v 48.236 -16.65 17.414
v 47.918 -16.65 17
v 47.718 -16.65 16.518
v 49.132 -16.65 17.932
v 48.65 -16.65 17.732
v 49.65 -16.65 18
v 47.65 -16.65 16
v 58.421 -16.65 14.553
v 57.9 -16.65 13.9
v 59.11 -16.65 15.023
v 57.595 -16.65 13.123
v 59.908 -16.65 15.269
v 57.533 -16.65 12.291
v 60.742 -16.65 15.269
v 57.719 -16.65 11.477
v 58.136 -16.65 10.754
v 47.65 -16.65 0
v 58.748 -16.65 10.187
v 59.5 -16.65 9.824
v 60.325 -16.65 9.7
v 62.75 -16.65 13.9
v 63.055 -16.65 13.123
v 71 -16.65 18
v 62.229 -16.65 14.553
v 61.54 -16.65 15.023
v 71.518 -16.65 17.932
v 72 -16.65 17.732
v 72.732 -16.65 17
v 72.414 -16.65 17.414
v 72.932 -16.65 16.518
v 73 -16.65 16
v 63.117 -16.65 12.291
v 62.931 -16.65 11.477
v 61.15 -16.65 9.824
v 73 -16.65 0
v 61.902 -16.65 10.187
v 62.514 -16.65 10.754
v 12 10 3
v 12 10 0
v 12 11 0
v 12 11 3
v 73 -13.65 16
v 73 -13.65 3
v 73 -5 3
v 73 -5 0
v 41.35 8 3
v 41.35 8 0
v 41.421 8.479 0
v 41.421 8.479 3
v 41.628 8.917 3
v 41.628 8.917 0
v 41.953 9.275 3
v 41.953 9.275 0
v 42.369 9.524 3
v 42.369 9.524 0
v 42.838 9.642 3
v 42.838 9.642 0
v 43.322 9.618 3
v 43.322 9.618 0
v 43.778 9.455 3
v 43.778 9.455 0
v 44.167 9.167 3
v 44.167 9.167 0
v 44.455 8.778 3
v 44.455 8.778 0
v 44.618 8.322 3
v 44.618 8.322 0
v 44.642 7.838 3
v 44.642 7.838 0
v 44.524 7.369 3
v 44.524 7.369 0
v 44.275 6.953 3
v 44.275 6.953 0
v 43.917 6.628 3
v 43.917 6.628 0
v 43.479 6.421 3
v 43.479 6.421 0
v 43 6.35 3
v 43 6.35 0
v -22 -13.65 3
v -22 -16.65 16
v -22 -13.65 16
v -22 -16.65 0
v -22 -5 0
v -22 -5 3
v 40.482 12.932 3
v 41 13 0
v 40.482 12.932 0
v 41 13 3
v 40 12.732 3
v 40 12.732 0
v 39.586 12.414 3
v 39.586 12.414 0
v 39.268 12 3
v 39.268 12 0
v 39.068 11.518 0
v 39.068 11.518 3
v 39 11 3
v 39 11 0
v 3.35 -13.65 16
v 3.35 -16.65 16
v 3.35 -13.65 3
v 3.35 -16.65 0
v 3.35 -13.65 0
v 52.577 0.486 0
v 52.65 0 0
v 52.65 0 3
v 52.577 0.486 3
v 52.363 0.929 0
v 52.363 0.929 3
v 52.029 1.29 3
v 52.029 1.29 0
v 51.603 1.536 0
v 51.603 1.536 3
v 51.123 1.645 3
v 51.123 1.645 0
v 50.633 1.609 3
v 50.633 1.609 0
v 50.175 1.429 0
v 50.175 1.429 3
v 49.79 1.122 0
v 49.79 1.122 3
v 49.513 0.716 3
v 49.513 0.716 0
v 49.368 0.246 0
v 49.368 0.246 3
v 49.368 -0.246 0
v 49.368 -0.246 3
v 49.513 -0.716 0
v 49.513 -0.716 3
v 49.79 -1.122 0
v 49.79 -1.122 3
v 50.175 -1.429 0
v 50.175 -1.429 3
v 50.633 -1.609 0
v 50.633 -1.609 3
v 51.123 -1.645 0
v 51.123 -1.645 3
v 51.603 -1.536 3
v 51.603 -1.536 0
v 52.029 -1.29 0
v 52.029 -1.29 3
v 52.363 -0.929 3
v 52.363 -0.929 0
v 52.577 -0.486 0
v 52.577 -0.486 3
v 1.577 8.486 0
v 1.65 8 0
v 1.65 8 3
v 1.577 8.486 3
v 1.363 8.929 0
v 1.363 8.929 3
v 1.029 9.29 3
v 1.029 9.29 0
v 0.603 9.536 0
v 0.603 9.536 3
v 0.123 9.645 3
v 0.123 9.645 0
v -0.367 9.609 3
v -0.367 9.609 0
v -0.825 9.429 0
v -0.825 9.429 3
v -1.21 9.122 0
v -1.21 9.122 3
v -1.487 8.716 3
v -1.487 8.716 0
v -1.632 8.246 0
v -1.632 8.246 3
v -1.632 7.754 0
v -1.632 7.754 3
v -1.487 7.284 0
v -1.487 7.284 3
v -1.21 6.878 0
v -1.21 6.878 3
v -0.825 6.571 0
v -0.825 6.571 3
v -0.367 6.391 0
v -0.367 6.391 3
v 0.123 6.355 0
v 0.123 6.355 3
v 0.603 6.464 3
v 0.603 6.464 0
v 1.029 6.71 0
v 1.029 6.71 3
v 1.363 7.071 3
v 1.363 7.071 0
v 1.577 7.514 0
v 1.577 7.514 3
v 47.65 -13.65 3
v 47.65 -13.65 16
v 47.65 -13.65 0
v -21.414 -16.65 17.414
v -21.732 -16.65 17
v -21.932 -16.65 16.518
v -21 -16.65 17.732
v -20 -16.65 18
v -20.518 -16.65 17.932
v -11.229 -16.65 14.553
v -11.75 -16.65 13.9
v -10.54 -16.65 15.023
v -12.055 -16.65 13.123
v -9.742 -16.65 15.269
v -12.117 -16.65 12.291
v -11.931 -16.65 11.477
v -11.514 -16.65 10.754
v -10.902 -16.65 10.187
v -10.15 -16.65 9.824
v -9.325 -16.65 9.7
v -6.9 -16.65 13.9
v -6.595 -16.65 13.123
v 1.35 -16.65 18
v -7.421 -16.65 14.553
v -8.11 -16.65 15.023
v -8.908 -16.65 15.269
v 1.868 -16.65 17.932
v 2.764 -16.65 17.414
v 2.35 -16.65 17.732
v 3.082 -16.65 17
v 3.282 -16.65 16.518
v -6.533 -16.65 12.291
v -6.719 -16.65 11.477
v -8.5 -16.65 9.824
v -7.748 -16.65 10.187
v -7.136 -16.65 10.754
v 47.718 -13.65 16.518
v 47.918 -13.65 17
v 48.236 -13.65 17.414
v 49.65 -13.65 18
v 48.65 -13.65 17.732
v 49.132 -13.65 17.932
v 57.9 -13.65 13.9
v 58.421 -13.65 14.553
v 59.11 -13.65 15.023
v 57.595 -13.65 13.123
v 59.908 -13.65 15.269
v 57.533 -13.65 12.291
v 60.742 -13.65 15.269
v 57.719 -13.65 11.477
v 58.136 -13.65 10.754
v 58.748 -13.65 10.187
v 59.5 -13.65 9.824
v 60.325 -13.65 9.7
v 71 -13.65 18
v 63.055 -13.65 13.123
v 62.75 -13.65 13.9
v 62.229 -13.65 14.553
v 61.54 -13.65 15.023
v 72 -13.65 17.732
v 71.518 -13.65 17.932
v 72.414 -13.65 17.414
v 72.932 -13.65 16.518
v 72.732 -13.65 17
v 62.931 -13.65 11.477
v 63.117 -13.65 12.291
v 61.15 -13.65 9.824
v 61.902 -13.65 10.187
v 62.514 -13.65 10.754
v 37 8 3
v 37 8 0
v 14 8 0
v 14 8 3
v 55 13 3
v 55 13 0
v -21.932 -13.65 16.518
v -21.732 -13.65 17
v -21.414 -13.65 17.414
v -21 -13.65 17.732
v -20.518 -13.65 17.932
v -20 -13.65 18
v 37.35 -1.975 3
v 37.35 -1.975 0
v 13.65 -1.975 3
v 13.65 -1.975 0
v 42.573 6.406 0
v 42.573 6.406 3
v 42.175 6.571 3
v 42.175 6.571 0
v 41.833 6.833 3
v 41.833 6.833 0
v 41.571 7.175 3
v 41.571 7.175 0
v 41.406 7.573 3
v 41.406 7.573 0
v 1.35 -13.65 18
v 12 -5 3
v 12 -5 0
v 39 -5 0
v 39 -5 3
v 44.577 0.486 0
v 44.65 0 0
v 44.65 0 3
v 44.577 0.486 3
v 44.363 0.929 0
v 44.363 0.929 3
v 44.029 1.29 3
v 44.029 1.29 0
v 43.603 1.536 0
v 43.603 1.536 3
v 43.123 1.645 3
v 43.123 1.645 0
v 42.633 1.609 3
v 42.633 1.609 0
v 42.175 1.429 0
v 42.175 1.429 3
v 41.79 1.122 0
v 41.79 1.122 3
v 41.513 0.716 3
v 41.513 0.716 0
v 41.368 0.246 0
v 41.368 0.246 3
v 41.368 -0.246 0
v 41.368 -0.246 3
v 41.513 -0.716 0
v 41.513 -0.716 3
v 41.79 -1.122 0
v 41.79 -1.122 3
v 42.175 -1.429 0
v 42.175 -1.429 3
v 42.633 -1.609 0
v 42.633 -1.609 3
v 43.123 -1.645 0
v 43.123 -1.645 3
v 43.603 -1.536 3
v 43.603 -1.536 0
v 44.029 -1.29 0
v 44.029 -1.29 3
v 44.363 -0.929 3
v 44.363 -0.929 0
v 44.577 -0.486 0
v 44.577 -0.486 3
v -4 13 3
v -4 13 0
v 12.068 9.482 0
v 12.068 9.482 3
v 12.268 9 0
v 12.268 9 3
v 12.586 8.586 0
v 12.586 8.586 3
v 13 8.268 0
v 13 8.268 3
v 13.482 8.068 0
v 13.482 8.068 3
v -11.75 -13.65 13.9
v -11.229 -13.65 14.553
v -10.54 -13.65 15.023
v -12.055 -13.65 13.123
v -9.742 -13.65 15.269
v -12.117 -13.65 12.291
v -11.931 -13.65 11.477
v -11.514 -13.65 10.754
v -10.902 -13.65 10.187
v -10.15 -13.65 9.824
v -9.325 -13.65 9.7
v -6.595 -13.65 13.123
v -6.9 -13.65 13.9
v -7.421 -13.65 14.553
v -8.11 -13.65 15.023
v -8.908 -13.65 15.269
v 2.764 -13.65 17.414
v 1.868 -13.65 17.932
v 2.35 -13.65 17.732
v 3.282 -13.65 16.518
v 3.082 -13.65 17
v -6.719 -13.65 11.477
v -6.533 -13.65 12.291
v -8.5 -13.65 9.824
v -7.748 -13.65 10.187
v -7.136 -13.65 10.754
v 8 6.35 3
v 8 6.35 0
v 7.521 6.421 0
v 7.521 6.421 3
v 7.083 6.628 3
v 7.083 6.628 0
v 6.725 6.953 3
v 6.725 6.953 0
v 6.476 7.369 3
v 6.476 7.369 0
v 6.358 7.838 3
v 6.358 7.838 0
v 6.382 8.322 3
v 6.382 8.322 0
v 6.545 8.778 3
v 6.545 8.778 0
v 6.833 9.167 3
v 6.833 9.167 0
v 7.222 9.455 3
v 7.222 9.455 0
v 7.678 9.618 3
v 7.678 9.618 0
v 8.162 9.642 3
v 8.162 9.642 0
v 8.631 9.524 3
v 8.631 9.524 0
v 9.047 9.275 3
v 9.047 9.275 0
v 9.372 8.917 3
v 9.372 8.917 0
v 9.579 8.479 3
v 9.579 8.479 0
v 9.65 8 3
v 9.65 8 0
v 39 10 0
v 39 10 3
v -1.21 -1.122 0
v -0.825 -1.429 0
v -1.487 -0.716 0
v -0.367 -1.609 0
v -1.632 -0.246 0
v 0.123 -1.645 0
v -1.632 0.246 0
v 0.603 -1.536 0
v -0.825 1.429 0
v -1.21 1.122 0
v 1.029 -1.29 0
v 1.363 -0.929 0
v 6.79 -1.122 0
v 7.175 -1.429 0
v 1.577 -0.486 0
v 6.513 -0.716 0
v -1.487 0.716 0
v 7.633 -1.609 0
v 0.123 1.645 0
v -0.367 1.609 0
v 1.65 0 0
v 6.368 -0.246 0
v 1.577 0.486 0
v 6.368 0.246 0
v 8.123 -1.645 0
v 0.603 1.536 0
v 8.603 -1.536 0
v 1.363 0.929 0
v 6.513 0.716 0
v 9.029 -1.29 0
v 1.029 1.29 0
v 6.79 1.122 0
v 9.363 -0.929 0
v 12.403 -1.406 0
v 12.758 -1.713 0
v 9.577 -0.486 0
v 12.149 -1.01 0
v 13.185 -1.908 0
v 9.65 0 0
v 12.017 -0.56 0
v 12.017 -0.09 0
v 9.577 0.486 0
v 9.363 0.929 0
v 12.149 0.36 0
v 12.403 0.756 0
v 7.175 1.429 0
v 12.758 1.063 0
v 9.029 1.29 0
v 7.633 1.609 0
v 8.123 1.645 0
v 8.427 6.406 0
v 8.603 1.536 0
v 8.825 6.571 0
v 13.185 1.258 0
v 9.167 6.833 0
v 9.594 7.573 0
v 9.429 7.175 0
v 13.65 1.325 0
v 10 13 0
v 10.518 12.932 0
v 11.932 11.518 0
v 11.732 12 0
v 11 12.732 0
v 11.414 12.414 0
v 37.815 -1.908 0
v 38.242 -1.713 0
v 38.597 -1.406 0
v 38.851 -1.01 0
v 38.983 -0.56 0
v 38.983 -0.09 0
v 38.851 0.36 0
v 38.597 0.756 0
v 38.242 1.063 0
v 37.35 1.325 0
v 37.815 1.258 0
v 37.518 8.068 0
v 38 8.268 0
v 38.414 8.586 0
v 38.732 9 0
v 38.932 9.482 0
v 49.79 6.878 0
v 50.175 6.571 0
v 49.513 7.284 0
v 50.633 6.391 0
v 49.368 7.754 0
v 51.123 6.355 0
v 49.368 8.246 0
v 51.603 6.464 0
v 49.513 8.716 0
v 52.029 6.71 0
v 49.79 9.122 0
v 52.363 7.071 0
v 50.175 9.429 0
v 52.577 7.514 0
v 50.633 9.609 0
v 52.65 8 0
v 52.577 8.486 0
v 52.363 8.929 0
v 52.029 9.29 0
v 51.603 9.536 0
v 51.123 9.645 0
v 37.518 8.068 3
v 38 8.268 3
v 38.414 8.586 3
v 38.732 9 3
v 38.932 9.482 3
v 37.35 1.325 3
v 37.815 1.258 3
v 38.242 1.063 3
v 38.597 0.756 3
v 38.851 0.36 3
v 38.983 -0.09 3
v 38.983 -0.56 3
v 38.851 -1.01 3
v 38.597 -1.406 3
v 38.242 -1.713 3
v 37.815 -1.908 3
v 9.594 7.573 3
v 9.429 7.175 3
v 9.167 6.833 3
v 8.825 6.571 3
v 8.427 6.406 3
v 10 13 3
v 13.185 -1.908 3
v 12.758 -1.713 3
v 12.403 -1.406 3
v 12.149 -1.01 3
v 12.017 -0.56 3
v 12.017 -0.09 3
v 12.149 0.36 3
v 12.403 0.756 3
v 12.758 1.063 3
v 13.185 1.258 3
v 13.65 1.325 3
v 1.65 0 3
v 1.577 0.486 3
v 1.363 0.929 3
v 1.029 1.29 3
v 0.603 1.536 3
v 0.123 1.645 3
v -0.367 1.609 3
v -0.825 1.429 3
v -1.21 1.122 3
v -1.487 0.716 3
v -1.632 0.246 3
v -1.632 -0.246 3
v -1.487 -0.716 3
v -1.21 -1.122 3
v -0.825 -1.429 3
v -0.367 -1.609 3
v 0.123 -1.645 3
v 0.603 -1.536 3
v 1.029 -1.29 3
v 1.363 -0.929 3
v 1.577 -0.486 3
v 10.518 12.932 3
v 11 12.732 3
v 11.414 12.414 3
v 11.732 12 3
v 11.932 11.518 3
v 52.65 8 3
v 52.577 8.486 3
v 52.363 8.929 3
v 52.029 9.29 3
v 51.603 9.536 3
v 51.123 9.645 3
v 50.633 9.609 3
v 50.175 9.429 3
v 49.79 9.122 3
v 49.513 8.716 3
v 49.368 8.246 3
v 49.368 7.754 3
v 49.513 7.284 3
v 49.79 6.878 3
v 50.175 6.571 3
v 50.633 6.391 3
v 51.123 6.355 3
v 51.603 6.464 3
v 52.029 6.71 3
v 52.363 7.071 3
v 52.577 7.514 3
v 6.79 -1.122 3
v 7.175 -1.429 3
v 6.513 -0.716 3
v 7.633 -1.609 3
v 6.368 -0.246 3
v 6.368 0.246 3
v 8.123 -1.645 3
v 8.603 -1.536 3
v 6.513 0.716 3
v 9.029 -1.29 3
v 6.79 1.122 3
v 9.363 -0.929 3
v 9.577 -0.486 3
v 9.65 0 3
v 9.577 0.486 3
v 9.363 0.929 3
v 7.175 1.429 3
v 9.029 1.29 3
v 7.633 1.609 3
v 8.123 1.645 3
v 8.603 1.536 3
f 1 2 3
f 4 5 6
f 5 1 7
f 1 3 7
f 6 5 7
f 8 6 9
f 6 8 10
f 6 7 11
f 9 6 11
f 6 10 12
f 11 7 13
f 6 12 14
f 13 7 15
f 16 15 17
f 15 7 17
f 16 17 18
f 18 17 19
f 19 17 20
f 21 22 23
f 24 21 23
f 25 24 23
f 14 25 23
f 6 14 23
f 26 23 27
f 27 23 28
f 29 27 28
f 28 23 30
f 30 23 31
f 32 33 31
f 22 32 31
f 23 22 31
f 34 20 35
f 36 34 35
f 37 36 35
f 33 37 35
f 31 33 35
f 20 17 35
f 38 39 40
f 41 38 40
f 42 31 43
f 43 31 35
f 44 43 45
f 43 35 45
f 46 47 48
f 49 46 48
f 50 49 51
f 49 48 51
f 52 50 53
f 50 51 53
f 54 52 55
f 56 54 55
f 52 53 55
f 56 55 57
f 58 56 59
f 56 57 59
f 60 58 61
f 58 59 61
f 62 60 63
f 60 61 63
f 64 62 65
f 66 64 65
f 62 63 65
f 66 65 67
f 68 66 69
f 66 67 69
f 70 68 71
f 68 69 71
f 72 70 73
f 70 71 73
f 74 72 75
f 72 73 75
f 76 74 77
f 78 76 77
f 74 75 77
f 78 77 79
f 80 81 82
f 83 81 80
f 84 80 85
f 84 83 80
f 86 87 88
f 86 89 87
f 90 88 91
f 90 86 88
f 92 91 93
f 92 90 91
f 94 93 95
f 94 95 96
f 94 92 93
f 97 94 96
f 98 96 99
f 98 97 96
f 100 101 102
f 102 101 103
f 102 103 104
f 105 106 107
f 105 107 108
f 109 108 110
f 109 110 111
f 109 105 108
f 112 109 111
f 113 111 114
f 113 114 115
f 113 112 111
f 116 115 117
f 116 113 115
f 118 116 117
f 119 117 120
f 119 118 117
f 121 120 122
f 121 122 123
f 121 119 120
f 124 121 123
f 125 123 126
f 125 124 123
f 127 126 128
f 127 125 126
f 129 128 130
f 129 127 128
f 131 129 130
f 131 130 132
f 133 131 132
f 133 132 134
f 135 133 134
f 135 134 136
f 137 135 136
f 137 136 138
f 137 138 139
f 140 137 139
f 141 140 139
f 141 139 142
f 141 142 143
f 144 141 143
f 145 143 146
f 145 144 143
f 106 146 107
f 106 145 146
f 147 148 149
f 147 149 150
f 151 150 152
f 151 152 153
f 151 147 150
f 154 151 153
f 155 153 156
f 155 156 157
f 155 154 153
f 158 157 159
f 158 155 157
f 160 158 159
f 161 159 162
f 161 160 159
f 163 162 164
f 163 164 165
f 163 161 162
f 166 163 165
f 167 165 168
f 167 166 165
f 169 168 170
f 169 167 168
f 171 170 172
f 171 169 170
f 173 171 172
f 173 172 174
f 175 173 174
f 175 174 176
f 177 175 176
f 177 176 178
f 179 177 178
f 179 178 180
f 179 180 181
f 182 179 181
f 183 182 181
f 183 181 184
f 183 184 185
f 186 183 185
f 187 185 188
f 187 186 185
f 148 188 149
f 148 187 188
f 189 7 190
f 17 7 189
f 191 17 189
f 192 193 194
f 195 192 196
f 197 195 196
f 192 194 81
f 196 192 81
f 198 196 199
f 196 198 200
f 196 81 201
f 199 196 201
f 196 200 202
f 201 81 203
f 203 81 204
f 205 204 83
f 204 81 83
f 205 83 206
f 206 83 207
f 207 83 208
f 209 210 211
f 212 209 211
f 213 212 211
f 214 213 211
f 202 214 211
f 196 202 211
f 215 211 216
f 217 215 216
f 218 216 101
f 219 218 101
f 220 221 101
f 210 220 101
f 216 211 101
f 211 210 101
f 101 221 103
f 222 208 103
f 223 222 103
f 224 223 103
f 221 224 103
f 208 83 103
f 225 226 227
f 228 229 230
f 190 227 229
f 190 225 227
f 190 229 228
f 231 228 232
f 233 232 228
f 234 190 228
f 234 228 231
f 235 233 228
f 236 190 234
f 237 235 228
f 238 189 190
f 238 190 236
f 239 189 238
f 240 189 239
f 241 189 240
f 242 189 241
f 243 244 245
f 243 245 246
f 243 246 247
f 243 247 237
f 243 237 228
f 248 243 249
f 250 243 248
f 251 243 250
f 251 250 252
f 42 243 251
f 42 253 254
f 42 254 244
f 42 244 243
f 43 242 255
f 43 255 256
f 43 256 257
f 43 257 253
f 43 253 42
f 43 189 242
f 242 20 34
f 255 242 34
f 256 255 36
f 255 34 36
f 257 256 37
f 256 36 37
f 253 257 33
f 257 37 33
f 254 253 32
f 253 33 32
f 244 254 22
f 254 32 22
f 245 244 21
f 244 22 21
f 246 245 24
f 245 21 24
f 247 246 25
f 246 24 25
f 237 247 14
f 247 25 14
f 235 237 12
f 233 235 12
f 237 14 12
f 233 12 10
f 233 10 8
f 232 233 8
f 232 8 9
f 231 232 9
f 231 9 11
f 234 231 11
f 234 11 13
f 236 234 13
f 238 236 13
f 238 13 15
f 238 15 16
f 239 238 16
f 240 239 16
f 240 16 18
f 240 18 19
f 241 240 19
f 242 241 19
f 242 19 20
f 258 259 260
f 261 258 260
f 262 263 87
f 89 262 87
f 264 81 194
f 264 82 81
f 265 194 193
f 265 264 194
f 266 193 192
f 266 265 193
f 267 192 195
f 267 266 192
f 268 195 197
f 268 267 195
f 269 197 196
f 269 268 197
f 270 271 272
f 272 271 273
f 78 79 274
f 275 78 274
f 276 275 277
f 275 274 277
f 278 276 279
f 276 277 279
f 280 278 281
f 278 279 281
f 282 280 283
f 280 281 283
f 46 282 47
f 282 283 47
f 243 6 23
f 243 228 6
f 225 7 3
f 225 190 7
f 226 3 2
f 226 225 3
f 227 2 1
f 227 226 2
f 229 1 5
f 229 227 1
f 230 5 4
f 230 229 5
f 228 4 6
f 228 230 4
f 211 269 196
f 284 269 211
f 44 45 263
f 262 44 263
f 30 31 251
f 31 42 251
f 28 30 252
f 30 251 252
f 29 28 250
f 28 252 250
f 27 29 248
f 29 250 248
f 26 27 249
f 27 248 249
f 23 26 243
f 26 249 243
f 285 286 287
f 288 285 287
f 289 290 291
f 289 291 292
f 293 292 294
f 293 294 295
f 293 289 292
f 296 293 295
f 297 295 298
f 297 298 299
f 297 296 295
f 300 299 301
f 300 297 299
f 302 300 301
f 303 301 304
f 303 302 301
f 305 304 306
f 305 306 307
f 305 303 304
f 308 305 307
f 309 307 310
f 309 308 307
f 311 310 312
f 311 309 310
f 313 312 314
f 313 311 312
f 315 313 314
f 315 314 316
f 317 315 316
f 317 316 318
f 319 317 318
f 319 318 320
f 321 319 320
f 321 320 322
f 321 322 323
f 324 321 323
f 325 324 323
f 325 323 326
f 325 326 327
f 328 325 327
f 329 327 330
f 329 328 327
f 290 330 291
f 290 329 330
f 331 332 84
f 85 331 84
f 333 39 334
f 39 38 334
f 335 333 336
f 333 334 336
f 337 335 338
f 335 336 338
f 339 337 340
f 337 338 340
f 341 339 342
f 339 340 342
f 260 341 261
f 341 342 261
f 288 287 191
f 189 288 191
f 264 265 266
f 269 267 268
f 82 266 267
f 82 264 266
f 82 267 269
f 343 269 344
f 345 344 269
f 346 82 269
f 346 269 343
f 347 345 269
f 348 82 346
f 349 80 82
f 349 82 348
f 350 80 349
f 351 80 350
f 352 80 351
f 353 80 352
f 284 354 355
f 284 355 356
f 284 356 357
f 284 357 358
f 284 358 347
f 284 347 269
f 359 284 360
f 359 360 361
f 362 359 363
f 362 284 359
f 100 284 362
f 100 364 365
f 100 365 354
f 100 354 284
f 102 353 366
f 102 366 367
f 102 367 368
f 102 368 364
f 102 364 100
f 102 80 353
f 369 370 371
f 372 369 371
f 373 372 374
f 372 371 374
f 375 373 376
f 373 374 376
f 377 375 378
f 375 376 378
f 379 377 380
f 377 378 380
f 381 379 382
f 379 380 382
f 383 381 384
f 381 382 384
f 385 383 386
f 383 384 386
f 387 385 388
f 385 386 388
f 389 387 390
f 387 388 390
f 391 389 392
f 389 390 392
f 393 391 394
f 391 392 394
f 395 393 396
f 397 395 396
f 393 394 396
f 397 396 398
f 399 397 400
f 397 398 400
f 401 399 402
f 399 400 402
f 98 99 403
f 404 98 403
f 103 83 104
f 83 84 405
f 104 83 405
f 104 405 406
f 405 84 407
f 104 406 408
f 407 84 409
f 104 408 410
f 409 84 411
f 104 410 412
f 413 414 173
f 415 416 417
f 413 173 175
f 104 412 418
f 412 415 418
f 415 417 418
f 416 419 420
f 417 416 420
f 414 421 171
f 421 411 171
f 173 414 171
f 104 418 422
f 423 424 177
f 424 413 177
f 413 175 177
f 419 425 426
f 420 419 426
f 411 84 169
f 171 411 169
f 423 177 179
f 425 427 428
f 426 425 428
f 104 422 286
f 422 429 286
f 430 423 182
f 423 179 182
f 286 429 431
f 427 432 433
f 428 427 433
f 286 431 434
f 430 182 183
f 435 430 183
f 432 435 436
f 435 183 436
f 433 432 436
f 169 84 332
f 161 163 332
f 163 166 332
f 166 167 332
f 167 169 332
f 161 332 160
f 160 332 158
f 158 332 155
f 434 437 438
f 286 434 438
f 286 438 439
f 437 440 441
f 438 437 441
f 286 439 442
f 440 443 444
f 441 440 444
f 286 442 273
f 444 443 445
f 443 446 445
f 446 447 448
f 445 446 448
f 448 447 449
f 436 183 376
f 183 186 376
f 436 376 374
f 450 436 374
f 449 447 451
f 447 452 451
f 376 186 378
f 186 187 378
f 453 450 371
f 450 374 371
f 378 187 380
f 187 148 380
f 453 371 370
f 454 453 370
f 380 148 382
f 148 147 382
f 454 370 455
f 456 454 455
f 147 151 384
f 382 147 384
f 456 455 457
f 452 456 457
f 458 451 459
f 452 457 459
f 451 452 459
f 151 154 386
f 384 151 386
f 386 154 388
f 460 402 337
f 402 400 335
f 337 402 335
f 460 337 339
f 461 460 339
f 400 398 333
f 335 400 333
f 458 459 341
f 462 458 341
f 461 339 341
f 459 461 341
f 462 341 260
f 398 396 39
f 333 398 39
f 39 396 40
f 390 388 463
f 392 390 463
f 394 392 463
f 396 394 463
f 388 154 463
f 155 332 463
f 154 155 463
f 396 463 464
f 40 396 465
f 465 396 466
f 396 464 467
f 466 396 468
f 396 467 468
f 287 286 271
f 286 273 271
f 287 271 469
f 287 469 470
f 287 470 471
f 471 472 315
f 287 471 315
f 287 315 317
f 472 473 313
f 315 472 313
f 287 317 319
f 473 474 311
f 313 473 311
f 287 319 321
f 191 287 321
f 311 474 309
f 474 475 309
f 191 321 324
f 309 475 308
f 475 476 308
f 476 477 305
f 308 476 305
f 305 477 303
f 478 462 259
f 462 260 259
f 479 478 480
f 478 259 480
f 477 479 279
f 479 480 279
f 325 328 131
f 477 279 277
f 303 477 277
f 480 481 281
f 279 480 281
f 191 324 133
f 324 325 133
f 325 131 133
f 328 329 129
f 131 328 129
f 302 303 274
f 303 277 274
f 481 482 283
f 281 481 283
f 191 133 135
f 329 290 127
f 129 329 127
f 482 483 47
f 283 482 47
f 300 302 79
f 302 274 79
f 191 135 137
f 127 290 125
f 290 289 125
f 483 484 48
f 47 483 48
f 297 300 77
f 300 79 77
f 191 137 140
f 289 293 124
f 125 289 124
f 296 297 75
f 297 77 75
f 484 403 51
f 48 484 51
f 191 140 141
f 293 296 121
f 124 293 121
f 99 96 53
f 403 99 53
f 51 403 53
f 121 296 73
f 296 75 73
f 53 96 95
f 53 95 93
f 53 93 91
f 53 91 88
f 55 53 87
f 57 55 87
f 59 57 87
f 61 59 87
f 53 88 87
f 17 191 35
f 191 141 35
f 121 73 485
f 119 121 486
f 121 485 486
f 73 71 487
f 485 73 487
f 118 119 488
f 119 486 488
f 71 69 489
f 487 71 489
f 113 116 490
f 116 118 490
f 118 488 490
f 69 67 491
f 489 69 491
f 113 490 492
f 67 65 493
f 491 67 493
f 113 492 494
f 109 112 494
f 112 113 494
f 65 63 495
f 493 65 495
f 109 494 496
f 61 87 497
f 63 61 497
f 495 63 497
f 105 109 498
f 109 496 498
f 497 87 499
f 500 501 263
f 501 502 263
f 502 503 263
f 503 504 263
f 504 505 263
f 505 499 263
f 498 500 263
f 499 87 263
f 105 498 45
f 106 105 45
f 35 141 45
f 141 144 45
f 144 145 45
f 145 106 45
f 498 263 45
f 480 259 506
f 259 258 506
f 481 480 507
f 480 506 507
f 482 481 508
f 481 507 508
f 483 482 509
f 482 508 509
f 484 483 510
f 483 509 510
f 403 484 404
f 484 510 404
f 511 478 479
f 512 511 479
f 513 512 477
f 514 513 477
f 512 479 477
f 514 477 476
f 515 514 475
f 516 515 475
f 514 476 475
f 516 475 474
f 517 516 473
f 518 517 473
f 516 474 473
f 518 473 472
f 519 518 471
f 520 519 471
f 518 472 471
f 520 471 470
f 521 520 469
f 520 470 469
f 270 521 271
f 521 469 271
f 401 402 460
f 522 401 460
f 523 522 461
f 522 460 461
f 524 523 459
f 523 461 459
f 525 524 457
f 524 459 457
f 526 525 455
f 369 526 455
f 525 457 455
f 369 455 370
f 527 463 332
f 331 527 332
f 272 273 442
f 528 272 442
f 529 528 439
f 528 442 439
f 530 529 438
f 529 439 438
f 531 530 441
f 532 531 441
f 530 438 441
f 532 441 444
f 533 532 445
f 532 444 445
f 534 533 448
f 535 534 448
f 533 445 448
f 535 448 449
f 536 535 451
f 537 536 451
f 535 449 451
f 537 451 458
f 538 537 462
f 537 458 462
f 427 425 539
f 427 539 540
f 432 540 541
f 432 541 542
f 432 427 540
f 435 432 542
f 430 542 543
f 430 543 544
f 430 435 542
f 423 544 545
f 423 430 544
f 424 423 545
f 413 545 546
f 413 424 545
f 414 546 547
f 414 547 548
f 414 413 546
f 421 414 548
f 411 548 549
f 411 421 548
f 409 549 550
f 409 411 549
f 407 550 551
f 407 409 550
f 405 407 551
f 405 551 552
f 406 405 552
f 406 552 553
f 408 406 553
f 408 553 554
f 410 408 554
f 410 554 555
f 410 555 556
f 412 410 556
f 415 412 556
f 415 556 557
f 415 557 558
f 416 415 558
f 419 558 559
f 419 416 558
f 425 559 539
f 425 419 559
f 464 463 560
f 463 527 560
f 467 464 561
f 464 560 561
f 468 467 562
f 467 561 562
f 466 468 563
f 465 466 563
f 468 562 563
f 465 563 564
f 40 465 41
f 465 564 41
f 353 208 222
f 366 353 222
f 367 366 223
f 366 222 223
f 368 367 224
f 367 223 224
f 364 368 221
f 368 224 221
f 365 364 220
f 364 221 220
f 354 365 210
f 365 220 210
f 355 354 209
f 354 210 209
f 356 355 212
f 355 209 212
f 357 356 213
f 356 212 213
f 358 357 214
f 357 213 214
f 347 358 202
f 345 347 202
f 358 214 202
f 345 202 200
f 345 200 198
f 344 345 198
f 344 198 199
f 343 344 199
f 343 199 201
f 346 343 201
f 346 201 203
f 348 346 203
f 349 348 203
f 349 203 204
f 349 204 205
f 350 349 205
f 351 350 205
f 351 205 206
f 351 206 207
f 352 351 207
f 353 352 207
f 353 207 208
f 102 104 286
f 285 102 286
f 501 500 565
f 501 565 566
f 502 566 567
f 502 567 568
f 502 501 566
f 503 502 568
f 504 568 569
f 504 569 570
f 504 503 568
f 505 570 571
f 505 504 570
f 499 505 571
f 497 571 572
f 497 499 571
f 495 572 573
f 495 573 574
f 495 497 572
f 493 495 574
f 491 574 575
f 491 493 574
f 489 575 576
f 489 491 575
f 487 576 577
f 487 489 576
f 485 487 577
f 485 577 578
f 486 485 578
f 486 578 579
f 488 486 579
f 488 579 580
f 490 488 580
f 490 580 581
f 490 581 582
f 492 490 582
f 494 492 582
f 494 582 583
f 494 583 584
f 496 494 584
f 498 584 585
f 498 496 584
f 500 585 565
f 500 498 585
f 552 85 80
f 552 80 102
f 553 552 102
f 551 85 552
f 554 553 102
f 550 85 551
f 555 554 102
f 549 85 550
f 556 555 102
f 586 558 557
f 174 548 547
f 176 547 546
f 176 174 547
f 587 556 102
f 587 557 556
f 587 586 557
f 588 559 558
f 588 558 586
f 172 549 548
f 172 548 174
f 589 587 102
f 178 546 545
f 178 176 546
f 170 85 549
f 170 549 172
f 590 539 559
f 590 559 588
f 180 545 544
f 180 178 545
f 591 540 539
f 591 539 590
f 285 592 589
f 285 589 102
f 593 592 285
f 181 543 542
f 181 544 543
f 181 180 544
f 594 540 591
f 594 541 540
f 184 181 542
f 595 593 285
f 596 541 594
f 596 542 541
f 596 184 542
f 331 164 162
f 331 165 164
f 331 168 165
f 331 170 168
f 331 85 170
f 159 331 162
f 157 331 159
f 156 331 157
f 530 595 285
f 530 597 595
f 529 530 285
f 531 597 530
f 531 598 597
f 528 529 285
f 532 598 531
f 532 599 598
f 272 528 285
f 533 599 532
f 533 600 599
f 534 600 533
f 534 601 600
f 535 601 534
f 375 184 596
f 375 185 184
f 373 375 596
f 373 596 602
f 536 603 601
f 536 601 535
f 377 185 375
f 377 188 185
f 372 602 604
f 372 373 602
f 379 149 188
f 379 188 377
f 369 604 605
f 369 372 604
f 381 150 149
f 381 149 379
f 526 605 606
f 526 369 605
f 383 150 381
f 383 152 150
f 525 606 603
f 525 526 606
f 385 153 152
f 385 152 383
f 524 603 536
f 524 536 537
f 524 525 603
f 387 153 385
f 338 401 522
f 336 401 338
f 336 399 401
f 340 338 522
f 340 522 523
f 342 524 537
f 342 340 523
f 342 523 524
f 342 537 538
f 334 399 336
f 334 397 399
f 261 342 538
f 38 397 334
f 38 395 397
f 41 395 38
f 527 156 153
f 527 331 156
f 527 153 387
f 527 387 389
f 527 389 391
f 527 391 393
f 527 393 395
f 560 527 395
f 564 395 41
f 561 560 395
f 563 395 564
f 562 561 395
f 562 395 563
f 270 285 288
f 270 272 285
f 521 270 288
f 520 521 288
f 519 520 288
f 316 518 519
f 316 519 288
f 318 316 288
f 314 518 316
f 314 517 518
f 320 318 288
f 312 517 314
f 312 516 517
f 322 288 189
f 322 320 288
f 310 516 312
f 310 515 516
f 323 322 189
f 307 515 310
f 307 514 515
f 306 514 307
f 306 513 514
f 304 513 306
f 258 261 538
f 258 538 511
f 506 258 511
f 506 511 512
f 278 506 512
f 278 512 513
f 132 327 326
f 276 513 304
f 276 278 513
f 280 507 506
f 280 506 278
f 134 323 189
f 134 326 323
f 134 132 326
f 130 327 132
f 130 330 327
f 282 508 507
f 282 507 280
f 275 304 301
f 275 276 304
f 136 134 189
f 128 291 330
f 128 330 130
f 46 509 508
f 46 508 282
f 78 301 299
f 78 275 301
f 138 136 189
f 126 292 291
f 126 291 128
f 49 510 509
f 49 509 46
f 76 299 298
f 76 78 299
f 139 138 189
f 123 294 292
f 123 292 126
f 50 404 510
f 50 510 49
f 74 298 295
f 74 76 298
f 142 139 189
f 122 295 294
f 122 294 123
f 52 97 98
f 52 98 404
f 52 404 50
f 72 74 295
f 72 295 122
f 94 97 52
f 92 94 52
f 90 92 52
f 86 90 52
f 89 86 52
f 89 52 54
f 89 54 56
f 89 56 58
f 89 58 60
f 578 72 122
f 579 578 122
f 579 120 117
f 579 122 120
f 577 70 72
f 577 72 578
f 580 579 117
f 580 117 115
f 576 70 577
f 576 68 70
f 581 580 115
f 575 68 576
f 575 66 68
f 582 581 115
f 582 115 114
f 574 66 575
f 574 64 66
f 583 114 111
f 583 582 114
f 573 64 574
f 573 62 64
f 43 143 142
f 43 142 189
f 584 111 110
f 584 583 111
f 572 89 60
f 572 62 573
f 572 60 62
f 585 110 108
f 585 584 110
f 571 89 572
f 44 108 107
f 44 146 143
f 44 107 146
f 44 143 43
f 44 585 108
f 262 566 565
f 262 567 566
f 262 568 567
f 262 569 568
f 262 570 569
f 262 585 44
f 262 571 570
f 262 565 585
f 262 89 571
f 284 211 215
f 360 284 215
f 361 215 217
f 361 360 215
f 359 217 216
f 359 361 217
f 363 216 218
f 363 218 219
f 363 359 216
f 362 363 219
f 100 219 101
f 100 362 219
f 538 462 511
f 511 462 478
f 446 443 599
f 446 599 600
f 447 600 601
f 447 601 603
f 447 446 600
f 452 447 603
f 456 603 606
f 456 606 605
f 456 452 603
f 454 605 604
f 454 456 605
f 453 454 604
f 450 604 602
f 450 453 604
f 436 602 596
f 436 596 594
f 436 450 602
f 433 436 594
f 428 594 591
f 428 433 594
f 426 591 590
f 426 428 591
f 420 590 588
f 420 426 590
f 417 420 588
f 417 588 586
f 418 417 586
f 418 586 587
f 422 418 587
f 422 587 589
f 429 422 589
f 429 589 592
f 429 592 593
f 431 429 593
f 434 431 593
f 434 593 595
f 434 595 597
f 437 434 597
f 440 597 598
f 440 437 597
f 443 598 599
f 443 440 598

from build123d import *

# Parameters (mm, degrees)
SKETCH_1_R          = 1.65
EXTRUDE_1_DEPTH     = 3
SKETCH_4_W          = 25.35
SKETCH_4_H          = 3
EXTRUDE_3_DEPTH     = 18
SKETCH_5_R          = 2.8
CUT_EXTRUDE_2_DEPTH = 18
FILLET_2_R          = 2


with BuildPart() as part:
    # 草图1 → 凸台-拉伸1 (new body)
    with BuildSketch(Plane.XY):
        Polygon((3.35, -13.65), (12, -5), (39, -5), (47.65, -13.65), (73, -13.65), (73, -5), (55, 13), (39, 13), (39, 8), (12, 8), (12, 13), (-4, 13), (-22, -5), (-22, -13.65), align=None)
        Circle(SKETCH_1_R, mode=Mode.SUBTRACT)
        with Locations((8, 0)):
            Circle(SKETCH_1_R, mode=Mode.SUBTRACT)
        with BuildLine():
            ThreePointArc((13.65, -1.975), (12, -0.325), (13.65, 1.325))
            Line((13.65, 1.325), (37.35, 1.325))
            ThreePointArc((37.35, 1.325), (39, -0.325), (37.35, -1.975))
            Line((37.35, -1.975), (13.65, -1.975))
        make_face(mode=Mode.SUBTRACT)
        with Locations((43, 0)):
            Circle(SKETCH_1_R, mode=Mode.SUBTRACT)
        with Locations((51, 0)):
            Circle(SKETCH_1_R, mode=Mode.SUBTRACT)
        with Locations((0, 8)):
            Circle(SKETCH_1_R, mode=Mode.SUBTRACT)
        with BuildLine():
            ThreePointArc((8, 6.35), (6.833273811, 9.166726189), (9.65, 8))
            ThreePointArc((9.65, 8), (9.166726189, 6.833273811), (8, 6.35))
        make_face(mode=Mode.SUBTRACT)
        with BuildLine():
            ThreePointArc((43, 6.35), (41.833273811, 6.833273811), (41.35, 8))
            ThreePointArc((41.35, 8), (44.166726189, 9.166726189), (43, 6.35))
        make_face(mode=Mode.SUBTRACT)
        with Locations((51, 8)):
            Circle(SKETCH_1_R, mode=Mode.SUBTRACT)
    extrude(amount=EXTRUDE_1_DEPTH)

    # 草图4 → 凸台-拉伸3 (add)
    with BuildSketch(Plane.XY):
        with Locations((-9.325, -15.15)):
            Rectangle(SKETCH_4_W, SKETCH_4_H)
        with Locations((60.325, -15.15)):
            Rectangle(SKETCH_4_W, SKETCH_4_H)
    extrude(amount=EXTRUDE_3_DEPTH)

    # 草图5 → 切除-拉伸2 (cut)
    with BuildSketch(Plane.XZ.offset(16.65)):
        with Locations(Location((60.325, 12.5, 0), (0, 0, 270))):
            Circle(SKETCH_5_R)
        with Locations(Location((-9.325, 12.5, 0), (0, 0, 270))):
            Circle(SKETCH_5_R)
    extrude(amount=-CUT_EXTRUDE_2_DEPTH, mode=Mode.SUBTRACT)

    # 圆角2
    fillet_2_edges = [part.edges().sort_by_distance(p)[0] for p in [
        (39, 13, 1.5),
        (12, 13, 1.5),
        (12, 8, 1.5),
        (39, 8, 1.5),
        (-22, -15.15, 18),
        (3.35, -15.15, 18),
        (47.65, -15.15, 18),
        (73, -15.15, 18),
    ]]
    fillet(fillet_2_edges, radius=FILLET_2_R)


solid = part.part
